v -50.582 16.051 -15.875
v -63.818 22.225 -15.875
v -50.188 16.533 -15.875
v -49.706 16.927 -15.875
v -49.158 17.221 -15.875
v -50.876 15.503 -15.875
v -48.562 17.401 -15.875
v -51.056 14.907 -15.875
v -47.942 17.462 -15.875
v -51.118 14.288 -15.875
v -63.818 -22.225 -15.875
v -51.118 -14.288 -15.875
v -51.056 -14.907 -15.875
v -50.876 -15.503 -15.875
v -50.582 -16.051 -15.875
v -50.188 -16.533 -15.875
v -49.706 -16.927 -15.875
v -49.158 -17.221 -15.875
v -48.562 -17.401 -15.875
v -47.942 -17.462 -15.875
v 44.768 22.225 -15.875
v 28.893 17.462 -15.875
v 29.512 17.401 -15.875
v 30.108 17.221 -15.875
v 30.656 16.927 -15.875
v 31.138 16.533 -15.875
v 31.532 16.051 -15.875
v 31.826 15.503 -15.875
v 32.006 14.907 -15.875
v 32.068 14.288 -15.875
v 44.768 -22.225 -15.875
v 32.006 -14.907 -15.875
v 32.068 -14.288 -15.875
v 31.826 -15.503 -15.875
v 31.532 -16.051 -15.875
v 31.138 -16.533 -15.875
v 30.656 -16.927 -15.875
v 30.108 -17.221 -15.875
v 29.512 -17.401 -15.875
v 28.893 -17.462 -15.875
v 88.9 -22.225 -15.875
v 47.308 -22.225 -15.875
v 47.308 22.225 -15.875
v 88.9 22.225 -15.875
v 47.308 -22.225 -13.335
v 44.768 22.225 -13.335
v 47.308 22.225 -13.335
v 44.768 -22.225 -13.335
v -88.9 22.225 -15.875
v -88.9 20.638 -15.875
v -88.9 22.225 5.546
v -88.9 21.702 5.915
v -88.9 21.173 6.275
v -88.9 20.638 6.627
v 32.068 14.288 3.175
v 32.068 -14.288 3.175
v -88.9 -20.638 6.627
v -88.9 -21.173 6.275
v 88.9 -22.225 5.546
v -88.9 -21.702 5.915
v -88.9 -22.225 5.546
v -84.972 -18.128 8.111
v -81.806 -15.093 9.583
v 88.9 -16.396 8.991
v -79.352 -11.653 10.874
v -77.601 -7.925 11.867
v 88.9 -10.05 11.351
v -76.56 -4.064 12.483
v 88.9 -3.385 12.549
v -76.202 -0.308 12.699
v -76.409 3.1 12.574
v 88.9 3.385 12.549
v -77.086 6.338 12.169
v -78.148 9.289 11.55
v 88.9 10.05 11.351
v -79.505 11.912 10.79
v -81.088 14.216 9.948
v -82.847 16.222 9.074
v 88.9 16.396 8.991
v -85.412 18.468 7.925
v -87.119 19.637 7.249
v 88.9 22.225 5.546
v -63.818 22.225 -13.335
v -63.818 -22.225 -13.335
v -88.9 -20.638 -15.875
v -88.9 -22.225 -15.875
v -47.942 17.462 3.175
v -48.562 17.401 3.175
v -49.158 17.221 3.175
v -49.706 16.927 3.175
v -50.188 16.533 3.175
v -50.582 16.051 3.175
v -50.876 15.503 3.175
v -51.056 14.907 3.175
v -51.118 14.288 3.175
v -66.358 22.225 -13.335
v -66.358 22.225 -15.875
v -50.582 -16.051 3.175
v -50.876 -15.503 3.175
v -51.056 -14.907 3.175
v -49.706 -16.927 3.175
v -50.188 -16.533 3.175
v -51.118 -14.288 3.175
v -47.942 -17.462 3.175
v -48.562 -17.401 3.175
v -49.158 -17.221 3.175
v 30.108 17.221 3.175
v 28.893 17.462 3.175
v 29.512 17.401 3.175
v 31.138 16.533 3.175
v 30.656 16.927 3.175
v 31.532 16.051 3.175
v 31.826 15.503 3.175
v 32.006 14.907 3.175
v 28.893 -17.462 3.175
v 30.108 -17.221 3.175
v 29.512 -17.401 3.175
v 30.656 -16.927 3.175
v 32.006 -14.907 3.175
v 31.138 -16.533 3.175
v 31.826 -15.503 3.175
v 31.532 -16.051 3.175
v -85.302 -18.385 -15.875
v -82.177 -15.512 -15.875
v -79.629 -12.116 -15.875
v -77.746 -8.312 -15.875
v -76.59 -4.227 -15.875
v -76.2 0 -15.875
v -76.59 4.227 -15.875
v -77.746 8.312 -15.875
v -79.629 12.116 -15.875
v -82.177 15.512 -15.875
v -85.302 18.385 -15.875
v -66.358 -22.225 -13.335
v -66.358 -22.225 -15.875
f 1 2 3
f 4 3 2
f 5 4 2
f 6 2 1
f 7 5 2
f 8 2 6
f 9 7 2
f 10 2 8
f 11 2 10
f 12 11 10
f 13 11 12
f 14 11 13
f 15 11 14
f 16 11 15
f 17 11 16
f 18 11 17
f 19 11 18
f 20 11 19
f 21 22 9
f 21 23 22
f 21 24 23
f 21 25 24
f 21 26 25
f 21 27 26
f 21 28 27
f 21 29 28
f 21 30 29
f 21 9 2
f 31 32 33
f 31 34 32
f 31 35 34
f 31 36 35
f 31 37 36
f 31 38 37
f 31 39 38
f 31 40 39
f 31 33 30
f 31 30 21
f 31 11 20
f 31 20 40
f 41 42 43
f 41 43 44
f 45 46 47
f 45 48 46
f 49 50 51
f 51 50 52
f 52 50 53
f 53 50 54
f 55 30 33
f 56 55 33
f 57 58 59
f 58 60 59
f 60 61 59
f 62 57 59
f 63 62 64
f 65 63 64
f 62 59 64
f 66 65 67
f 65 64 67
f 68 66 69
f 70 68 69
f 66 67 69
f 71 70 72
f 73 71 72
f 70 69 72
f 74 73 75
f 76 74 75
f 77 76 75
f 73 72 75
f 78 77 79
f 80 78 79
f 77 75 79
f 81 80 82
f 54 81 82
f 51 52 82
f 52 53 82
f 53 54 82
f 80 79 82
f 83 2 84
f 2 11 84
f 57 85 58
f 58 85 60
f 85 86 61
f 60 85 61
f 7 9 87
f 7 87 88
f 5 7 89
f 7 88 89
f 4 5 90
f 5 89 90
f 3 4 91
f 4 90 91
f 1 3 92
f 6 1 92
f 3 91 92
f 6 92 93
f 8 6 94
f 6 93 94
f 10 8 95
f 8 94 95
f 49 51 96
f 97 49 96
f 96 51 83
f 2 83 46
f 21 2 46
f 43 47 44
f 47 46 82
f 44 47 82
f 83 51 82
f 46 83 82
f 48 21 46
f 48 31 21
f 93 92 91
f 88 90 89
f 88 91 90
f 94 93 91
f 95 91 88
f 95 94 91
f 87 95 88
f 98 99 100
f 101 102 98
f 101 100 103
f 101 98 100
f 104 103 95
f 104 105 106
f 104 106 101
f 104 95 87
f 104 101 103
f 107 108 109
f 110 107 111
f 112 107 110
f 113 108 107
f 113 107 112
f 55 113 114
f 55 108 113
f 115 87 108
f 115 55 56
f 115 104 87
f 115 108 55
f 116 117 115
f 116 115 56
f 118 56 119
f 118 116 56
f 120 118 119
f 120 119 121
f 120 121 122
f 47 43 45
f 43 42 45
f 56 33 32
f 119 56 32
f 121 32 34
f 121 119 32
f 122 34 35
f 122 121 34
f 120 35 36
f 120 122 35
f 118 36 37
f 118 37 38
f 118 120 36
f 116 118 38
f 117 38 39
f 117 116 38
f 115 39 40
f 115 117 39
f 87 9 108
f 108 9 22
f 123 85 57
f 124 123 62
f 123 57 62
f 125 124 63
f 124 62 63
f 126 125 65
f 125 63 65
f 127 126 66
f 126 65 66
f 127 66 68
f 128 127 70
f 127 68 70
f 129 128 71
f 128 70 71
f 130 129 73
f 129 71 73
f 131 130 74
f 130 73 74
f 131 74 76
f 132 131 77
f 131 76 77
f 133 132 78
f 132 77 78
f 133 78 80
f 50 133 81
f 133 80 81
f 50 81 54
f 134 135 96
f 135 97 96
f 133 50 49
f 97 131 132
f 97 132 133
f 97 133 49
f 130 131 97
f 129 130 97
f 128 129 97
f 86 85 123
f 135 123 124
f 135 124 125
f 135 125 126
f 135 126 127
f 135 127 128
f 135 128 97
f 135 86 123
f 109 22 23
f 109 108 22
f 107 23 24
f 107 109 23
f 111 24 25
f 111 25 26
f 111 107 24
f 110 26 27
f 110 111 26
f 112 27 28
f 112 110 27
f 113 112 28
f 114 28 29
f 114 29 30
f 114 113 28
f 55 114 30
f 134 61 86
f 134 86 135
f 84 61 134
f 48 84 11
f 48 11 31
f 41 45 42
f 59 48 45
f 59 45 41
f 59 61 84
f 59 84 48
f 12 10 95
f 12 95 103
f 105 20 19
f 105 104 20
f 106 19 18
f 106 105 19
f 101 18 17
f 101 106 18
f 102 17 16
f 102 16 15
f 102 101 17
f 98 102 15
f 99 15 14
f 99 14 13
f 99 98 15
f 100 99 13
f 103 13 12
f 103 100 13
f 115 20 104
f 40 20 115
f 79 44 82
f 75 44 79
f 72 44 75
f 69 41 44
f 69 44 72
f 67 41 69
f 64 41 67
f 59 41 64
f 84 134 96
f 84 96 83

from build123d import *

# Parameters (mm, degrees)
F0_W          = 177.8
F0_H          = 31.75
F11_DEPTH     = 22.225
F1_W          = 2.54
F1_H          = 2.54
F2_DEPTH      = 22.225
F2_DEPTH_BACK = 22.225
F4_DEPTH      = 31.751
F6_DEPTH      = 177.801
F7_W          = 83.185
F7_H          = 34.925
F8_DEPTH      = 19.05
F9_R          = 3.175


with BuildPart() as f11:
    # F0 (on Front) → F11 (new body, symmetric)
    with BuildSketch(Plane.XZ):
        Rectangle(F0_W, F0_H)
    extrude(amount=F11_DEPTH, both=True)

    # F1 (on Front) → F2 (cut, two sides)
    with BuildSketch(Plane.XZ) as f2_sk:
        with Locations((-65.0875, -14.605)):
            Rectangle(F1_W, F1_H)
        with Locations((46.0375, -14.605)):
            Rectangle(F1_W, F1_H)
    extrude(amount=F2_DEPTH, mode=Mode.SUBTRACT)
    extrude(f2_sk.sketch, amount=-F2_DEPTH_BACK, mode=Mode.SUBTRACT)

    # F3 (on face) → F4 (cut, through all)
    with BuildSketch(Plane.XY.offset(15.875)):
        with BuildLine():
            Line((-88.9, 20.6375), (-88.9, -20.6375))
            ThreePointArc((-88.9, -20.6375), (-76.2, 0), (-88.9, 20.6375))
        make_face()
    extrude(amount=-F4_DEPTH, mode=Mode.SUBTRACT)

    # F5 (on face) → F6 (cut, through all)
    with BuildSketch(Plane.YZ.offset(88.9)):
        with BuildLine():
            ThreePointArc((-22.225, 5.546072), (0, 12.7), (22.225, 5.546072))
            Line((22.225, 5.546072), (22.225, 15.875))
            Line((22.225, 15.875), (-22.225, 15.875))
            Line((-22.225, 15.875), (-22.225, 5.546072))
        make_face()
    extrude(amount=-F6_DEPTH, mode=Mode.SUBTRACT)

    # F7 (on face) → F8 (cut)
    with BuildSketch(Plane(origin=(0, 0, -15.875), x_dir=(1, 0, 0), z_dir=(0, 0, -1))):
        with Locations((-9.525, 0)):
            Rectangle(F7_W, F7_H)
    extrude(amount=-F8_DEPTH, mode=Mode.SUBTRACT)

    # F9
    f9_edges = [f11.edges().sort_by_distance(p)[0] for p in [
        (32.0675, -17.4625, -6.35),
        (-51.1175, -17.4625, -6.35),
        (-51.1175, 17.4625, -6.35),
        (32.0675, 17.4625, -6.35),
    ]]
    fillet(f9_edges, radius=F9_R)


solid = f11.part
